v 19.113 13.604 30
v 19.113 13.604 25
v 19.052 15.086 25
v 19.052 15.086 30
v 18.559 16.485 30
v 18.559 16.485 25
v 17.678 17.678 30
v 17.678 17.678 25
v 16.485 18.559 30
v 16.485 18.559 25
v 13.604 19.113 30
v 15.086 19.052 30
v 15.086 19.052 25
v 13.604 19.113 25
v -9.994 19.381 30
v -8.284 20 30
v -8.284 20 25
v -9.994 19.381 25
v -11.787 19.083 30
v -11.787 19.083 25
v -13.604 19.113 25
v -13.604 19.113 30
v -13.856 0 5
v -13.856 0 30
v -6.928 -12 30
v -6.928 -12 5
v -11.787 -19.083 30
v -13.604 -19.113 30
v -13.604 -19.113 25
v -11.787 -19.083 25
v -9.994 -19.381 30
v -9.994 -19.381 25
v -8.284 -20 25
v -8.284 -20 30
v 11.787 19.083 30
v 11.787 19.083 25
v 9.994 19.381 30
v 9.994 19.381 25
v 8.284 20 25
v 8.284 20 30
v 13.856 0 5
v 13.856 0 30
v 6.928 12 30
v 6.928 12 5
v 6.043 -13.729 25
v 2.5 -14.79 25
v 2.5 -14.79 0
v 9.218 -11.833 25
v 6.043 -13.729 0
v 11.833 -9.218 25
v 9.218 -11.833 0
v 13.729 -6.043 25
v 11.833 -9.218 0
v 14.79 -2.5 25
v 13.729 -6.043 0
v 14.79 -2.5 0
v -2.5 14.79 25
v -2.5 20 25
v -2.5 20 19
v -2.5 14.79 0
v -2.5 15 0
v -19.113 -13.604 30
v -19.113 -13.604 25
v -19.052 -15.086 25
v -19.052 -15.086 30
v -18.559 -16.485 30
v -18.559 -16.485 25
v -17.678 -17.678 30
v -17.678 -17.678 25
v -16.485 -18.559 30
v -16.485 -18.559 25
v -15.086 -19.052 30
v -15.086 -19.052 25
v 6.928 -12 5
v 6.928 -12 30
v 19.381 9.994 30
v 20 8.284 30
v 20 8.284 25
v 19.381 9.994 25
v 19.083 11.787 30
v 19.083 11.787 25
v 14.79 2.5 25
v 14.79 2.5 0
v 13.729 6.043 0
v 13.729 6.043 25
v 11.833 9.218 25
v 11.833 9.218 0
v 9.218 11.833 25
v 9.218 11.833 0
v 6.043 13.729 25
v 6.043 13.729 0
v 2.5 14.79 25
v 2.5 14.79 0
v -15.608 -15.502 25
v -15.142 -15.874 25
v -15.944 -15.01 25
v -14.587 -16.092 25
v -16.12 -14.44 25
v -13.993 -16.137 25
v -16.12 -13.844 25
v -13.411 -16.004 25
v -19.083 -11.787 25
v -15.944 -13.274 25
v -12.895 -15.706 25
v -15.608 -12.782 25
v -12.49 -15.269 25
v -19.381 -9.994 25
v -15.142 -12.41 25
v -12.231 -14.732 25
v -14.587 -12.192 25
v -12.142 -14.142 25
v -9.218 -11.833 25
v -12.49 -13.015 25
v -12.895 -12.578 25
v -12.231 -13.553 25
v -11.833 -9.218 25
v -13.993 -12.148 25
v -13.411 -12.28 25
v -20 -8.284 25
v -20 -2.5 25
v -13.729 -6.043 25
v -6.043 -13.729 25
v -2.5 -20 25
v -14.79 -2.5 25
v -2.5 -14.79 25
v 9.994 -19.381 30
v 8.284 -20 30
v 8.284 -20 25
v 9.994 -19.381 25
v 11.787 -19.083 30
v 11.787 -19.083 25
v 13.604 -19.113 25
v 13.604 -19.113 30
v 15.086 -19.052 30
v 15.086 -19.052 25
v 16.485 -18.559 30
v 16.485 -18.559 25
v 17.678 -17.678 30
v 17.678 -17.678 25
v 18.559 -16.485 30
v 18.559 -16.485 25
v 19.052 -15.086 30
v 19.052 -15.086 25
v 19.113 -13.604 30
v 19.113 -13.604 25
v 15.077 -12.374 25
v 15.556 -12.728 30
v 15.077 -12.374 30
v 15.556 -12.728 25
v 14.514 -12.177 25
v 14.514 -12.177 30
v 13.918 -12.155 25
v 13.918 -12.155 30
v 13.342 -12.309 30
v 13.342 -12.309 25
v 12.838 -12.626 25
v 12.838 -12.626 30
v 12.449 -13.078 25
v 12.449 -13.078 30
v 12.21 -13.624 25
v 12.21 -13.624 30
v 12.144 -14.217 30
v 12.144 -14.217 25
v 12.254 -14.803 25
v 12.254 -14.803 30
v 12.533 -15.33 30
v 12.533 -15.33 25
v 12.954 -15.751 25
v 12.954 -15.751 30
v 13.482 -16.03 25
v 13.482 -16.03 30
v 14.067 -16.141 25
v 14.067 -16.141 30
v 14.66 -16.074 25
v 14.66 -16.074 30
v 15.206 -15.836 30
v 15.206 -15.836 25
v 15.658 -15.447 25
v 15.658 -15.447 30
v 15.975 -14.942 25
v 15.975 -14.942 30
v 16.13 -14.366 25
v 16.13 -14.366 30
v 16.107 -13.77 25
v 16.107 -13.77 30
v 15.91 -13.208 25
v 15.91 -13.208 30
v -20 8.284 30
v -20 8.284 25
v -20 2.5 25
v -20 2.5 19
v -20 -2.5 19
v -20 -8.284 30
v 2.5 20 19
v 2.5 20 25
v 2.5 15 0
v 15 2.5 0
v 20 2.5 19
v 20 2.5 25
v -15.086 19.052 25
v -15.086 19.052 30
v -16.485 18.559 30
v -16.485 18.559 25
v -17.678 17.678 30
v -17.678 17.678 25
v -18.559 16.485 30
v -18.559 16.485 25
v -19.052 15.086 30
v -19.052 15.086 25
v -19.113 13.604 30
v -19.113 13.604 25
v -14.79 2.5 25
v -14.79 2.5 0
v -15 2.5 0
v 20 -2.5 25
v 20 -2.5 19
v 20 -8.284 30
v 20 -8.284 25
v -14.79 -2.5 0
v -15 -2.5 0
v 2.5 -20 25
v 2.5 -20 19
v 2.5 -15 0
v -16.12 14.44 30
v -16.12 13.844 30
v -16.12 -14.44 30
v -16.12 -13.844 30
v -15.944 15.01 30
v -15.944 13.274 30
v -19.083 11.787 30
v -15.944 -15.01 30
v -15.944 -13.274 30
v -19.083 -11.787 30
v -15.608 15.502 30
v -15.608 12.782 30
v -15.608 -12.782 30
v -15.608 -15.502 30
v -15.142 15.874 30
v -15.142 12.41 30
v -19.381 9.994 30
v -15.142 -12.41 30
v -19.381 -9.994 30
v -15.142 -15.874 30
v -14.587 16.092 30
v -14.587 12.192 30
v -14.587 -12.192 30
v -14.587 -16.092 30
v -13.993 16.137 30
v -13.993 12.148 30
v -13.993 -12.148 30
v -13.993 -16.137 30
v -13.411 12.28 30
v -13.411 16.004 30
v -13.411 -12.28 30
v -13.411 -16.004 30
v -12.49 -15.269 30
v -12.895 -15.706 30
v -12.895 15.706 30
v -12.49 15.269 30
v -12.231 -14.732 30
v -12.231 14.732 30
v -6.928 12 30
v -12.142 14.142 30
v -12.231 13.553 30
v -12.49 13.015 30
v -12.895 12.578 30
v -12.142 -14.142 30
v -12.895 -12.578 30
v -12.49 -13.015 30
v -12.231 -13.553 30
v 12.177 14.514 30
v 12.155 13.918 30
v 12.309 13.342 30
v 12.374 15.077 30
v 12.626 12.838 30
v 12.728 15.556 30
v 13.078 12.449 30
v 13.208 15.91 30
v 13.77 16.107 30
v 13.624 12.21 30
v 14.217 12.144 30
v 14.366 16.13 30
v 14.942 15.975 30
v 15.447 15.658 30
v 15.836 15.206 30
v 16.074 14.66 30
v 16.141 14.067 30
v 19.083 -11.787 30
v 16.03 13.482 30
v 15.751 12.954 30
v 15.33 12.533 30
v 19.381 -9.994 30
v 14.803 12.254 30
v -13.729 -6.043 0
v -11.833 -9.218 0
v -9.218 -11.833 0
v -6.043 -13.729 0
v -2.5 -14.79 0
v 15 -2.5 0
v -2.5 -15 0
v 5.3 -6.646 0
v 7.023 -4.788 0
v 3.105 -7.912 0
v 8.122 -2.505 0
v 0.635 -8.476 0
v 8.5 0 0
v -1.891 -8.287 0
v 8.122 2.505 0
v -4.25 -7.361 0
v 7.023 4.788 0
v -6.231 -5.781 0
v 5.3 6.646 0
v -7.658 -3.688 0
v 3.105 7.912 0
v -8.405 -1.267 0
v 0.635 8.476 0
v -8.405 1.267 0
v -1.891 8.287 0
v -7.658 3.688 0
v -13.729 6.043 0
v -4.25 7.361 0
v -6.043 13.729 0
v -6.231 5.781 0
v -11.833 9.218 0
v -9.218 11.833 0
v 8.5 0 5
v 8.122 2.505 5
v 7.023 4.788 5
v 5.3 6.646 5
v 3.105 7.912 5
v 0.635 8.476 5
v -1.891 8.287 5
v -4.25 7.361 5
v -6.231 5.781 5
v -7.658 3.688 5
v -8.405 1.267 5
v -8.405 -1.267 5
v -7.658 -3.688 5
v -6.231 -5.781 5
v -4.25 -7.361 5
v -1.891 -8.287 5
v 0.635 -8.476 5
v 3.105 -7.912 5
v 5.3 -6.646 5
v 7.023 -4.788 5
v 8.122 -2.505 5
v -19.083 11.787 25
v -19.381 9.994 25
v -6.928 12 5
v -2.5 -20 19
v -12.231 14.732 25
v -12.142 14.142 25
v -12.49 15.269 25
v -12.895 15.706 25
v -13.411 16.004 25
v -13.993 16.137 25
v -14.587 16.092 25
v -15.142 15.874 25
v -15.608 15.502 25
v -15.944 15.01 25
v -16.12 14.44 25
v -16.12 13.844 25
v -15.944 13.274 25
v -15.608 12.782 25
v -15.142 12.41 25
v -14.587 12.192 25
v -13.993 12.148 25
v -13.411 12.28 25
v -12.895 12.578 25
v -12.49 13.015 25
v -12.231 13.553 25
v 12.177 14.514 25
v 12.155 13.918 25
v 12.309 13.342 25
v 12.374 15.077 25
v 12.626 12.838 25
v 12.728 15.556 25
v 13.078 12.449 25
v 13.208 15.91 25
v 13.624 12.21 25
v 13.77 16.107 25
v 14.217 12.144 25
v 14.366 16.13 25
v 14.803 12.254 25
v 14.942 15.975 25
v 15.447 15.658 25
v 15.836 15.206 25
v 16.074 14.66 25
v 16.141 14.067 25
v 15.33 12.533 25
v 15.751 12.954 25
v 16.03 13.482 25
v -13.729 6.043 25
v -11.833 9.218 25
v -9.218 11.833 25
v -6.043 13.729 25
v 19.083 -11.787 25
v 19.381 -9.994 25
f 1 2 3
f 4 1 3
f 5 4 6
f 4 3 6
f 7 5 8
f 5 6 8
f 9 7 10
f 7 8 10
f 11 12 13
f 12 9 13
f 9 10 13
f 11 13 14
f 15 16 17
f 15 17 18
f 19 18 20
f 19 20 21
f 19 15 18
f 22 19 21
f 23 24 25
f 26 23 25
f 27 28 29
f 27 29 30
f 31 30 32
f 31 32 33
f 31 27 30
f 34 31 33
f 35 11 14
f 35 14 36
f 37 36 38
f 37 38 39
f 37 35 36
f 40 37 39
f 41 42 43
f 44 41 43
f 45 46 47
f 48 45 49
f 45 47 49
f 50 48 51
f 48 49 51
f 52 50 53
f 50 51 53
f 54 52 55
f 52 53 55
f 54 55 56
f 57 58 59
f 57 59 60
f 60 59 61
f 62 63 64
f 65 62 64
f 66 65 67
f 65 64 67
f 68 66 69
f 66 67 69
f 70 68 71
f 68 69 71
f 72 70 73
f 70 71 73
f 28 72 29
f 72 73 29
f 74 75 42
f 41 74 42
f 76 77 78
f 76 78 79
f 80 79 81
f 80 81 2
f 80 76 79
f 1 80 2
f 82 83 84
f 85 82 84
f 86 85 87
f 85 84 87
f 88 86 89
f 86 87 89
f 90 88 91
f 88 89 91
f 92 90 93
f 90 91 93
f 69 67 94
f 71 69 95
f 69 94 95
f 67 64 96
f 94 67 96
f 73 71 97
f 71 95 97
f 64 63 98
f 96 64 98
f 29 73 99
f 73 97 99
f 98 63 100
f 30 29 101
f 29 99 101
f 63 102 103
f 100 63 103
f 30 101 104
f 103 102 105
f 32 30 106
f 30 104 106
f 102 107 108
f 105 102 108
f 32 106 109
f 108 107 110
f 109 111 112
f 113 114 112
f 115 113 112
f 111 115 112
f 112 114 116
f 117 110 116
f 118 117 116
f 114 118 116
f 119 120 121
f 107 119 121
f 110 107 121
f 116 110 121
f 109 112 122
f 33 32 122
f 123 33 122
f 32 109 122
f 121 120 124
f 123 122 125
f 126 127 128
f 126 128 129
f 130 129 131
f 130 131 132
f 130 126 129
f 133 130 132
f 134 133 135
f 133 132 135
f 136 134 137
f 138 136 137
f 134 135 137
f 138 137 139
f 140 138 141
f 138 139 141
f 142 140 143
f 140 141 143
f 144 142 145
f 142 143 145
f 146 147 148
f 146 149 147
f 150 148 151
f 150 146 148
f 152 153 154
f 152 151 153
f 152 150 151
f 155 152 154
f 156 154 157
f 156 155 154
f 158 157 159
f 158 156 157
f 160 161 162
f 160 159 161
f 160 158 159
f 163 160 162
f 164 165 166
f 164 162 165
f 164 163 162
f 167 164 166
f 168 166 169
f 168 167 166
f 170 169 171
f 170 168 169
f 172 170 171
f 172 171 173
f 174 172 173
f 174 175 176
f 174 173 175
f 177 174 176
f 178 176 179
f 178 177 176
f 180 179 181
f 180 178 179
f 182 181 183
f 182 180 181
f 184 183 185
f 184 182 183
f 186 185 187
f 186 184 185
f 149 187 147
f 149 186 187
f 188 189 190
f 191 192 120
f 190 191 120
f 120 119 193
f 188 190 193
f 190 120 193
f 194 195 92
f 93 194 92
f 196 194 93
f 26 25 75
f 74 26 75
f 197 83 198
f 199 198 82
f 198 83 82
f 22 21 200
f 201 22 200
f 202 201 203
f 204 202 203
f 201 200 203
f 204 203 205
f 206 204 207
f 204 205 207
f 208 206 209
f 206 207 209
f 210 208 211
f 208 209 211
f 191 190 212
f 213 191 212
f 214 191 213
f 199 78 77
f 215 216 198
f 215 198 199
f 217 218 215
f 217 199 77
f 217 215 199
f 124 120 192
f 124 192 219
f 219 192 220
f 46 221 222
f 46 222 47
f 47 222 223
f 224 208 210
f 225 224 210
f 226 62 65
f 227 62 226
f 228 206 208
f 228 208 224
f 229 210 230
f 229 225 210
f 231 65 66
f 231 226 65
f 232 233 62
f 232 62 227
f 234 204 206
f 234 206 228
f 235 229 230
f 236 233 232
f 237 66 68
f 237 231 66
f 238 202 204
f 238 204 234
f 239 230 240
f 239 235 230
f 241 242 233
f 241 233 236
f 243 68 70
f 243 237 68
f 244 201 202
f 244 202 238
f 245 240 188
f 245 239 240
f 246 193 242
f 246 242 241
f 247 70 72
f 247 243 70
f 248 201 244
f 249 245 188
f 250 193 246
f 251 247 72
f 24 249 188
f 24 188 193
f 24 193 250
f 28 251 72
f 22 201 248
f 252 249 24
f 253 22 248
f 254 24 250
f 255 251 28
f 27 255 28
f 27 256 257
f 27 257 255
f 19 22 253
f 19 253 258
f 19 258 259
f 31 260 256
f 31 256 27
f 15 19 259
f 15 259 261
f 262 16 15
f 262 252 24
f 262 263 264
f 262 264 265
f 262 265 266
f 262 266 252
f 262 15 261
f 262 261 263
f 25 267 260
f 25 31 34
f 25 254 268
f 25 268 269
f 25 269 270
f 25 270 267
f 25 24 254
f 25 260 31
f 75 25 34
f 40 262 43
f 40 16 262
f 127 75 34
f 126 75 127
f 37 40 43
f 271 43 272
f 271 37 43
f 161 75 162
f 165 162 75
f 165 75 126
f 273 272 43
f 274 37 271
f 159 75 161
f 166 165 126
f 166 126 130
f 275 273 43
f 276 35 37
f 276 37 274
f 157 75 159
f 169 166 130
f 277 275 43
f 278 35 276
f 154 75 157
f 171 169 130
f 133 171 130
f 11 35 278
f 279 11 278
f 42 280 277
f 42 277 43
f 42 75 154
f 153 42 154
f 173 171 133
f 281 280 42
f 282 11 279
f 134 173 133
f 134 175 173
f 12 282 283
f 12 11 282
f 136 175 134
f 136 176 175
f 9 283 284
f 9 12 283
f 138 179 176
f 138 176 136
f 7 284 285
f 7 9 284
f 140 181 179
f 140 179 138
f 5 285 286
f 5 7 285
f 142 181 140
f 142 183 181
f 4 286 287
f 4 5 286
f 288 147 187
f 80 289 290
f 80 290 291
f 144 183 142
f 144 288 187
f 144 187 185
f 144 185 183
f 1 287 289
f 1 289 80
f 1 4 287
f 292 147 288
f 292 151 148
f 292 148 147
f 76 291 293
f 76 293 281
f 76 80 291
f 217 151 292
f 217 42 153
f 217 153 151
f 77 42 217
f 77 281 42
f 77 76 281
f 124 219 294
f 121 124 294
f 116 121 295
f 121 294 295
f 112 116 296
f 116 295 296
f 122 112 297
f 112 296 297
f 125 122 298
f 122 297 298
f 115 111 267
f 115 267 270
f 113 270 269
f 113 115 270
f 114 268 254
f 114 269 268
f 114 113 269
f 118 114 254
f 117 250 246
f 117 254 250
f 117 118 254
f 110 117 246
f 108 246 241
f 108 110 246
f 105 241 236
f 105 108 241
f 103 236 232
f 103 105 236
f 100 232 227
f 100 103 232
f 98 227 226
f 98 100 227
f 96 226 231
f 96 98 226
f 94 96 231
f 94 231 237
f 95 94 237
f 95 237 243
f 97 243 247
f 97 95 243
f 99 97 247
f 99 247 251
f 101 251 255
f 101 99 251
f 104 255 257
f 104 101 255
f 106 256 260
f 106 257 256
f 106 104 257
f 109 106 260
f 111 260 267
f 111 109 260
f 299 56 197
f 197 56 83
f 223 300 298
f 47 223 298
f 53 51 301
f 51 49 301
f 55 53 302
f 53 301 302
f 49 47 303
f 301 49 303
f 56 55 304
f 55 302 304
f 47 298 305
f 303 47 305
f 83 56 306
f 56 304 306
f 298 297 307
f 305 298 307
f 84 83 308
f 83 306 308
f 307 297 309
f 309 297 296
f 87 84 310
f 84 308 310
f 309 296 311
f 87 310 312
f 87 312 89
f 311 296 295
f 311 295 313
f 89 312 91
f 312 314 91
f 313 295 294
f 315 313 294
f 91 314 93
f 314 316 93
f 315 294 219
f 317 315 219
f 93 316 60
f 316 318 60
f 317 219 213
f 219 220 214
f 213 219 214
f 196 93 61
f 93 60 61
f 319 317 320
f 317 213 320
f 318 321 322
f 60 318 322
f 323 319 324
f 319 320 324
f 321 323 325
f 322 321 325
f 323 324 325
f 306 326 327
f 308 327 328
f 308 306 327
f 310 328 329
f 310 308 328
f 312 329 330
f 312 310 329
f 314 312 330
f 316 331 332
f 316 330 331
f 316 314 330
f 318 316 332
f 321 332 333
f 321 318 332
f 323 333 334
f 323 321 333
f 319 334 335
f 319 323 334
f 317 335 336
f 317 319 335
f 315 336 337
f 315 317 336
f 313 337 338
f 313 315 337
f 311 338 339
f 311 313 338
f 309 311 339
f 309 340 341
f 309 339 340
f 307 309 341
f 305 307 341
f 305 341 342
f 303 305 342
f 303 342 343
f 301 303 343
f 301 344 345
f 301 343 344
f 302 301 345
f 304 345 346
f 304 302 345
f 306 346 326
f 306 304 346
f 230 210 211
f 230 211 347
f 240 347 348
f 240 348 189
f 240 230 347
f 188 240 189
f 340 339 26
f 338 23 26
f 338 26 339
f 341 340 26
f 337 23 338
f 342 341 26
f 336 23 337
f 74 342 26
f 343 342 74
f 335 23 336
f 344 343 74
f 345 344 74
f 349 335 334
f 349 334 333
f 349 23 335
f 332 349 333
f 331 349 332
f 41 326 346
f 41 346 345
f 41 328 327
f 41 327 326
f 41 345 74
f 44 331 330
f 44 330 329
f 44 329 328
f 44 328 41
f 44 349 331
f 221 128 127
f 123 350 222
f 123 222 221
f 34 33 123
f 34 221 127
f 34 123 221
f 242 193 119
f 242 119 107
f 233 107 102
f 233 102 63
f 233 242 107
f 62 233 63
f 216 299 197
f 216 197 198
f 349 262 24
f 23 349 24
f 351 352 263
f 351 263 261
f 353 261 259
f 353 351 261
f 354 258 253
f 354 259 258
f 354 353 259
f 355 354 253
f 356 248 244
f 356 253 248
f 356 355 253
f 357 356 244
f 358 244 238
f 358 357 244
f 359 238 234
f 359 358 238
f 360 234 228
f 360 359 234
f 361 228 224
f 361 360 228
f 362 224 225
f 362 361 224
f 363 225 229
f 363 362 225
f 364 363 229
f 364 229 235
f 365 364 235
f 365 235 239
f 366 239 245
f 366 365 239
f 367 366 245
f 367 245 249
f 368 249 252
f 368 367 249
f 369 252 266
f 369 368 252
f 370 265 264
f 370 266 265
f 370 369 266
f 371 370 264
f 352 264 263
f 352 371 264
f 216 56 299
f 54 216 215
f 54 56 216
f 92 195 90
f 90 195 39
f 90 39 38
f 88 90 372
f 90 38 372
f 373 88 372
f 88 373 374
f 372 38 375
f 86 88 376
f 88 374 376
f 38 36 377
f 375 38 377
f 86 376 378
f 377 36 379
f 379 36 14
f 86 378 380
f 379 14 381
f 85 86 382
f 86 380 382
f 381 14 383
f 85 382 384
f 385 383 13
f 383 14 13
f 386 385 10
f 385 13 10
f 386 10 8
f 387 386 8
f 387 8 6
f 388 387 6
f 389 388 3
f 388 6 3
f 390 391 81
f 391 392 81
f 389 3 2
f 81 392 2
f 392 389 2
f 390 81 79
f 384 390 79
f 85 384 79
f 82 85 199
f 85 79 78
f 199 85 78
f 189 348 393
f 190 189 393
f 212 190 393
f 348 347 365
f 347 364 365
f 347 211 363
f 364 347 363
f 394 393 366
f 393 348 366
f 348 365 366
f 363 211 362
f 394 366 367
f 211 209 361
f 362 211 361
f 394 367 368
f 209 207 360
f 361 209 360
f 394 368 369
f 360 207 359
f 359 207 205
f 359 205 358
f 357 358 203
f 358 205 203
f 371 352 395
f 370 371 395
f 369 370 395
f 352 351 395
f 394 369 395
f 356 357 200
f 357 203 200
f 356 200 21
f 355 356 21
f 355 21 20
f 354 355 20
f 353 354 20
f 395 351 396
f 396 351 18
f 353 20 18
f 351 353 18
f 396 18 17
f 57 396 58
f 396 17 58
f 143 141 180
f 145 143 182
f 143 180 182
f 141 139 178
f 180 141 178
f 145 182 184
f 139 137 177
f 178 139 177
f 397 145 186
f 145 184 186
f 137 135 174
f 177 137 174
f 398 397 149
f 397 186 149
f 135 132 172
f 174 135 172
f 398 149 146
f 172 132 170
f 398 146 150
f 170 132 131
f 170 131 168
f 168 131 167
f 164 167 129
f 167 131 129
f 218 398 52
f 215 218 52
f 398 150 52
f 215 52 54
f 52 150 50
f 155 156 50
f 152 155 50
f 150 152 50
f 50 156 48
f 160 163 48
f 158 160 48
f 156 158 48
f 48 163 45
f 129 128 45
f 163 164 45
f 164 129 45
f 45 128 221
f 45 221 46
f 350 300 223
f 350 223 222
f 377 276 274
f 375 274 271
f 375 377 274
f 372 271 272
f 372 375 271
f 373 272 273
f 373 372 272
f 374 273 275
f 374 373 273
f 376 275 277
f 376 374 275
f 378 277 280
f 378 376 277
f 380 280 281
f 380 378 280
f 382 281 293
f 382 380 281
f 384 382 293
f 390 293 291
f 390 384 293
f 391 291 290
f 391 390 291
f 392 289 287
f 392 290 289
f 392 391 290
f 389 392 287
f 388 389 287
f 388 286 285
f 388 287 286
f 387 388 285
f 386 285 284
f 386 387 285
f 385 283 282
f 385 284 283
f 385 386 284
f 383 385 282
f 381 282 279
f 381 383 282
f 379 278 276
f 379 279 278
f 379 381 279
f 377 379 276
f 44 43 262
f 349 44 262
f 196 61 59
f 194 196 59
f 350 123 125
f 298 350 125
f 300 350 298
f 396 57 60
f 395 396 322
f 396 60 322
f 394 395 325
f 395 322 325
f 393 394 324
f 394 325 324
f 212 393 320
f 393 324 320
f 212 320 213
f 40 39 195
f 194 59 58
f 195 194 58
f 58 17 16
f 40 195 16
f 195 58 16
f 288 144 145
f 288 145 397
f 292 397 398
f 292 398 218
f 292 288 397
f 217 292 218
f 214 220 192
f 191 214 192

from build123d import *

# Parameters (mm, degrees)
SKETCH_1_R                      = 15
EXTRUDE_1_DEPTH                 = 30
EXTRUDE_3_DEPTH                 = 5
SKETCH_6_W                      = 5
SKETCH_6_H                      = 30
EXTRUDE_4_DEPTH                 = 30
RIB_START                       = -2.5
RIB_3_DEPTH                     = 5
PATTERN_CIRCULAR_1_COUNT        = 2
PATTERN_CIRCULAR_1_ANGLE        = 90
PATTERN_START                   = -2.5
PATTERN_CIRCULAR_1_COPY_1_DEPTH = 5
CUT_EXTRUDE_1_DEPTH             = 25
SKETCH_9_R                      = 8.5
CUT_EXTRUDE_3_DEPTH             = 42.231056256
EXTRUDE_START                   = 25
SKETCH_10_R                     = 5
SKETCH_10_R_2                   = 2
EXTRUDE_5_DEPTH                 = 5
SKETCH_10_2_R                   = 2
CUT_EXTRUDE_4_DEPTH             = 42.231056256
FILLET_1_R                      = 10


# Read off the part's stored shape, not the designer's step: 筋3
with BuildPart() as part:
    # 草图1 → 凸台-拉伸1 (new body)
    with BuildSketch(Plane.XY):
        Circle(SKETCH_1_R)
    extrude(amount=EXTRUDE_1_DEPTH)

    # 草图3 → 凸台-拉伸3 (add)
    with BuildSketch(Plane.XY.offset(30)):
        Polygon((20, -8.284271247), (20, 8.284271247), (8.284271247, 20), (-8.284271247, 20), (-20, 8.284271247), (-20, -8.284271247), (-8.284271247, -20), (8.284271247, -20), align=None)
    extrude(amount=-EXTRUDE_3_DEPTH)

    # 草图6 → 凸台-拉伸4 (add, through all)
    with BuildSketch(Plane.XY):
        Rectangle(SKETCH_6_W, SKETCH_6_H)
    extrude_4 = extrude(amount=EXTRUDE_4_DEPTH)

    # 筋3 outline → 筋3 (add)
    with BuildSketch(Plane(origin=(0, 0, 0), x_dir=(0, 0, -1), z_dir=(1, 0, 0)).offset(RIB_START)):
        Polygon((0, 15), (-19, 20), (-25, 20), (-25, 15), align=None)
    rib_3 = extrude(amount=RIB_3_DEPTH)

    # 镜向1: 筋3 across plane
    add(rib_3.mirror(Plane.ZX))

    # 阵列(圆周)1: 凸台-拉伸4, 筋3 ×2 about axis
    pattern_circular_1_axis = Axis((0, 0, 0), (0, 0, 1))
    add([extrude_4.rotate(pattern_circular_1_axis, i * PATTERN_CIRCULAR_1_ANGLE / (PATTERN_CIRCULAR_1_COUNT - 1)) for i in range(1, PATTERN_CIRCULAR_1_COUNT)])
    add([rib_3.rotate(pattern_circular_1_axis, i * PATTERN_CIRCULAR_1_ANGLE / (PATTERN_CIRCULAR_1_COUNT - 1)) for i in range(1, PATTERN_CIRCULAR_1_COUNT)])

    # 阵列(圆周)1 copy 1 sketch → 阵列(圆周)1 copy 1 (add)
    with BuildSketch(Plane(origin=(0, 0, 0), x_dir=(0, 0, -1), z_dir=(0, 1, 0)).offset(PATTERN_START)):
        Polygon((0, -15), (-19, -20), (-25, -20), (-25, -15), align=None)
    extrude(amount=PATTERN_CIRCULAR_1_COPY_1_DEPTH)

    # 草图8 → 切除-拉伸1 (cut)
    with BuildSketch(Plane.XY.offset(30)):
        Polygon((6.92820323, 12), (-6.92820323, 12), (-13.856406461, 0), (-6.92820323, -12), (6.92820323, -12), (13.856406461, 0), align=None)
    extrude(amount=-CUT_EXTRUDE_1_DEPTH, mode=Mode.SUBTRACT)

    # 草图9 → 切除-拉伸3 (cut, through all)
    with BuildSketch(Plane.XY):
        Circle(SKETCH_9_R)
    extrude(amount=CUT_EXTRUDE_3_DEPTH, mode=Mode.SUBTRACT)

    # 草图10 → 凸台-拉伸5 (add, through all)
    # profile 1 of 4: a face of its own
    with BuildSketch(Plane.XY.offset(EXTRUDE_START)):
        with Locations((14.142135624, 14.142135624)):
            Circle(SKETCH_10_R)
        with Locations((14.142135624, 14.142135624)):
            Circle(SKETCH_10_R_2, mode=Mode.SUBTRACT)
    # profile 2 of 4: a face of its own
    with BuildSketch(Plane.XY.offset(EXTRUDE_START)):
        with Locations((14.142135624, -14.142135624)):
            Circle(SKETCH_10_R)
        with Locations((14.142135624, -14.142135624)):
            Circle(SKETCH_10_R_2, mode=Mode.SUBTRACT)
    # profile 3 of 4: a face of its own
    with BuildSketch(Plane.XY.offset(EXTRUDE_START)):
        with Locations((-14.142135624, -14.142135624)):
            Circle(SKETCH_10_R)
        with Locations((-14.142135624, -14.142135624)):
            Circle(SKETCH_10_R_2, mode=Mode.SUBTRACT)
    # profile 4 of 4: a face of its own
    with BuildSketch(Plane.XY.offset(EXTRUDE_START)):
        with Locations((-14.142135624, 14.142135624)):
            Circle(SKETCH_10_R)
        with Locations((-14.142135624, 14.142135624)):
            Circle(SKETCH_10_R_2, mode=Mode.SUBTRACT)
    extrude(amount=EXTRUDE_5_DEPTH)

    # 草图10<2> → 切除-拉伸4 (cut, through all)
    with BuildSketch(Plane.XY):
        with Locations((-14.142135624, 14.142135624)):
            Circle(SKETCH_10_2_R)
        with Locations((14.142135624, 14.142135624)):
            Circle(SKETCH_10_2_R)
        with Locations((14.142135624, -14.142135624)):
            Circle(SKETCH_10_2_R)
        with Locations((-14.142135624, -14.142135624)):
            Circle(SKETCH_10_2_R)
    extrude(amount=CUT_EXTRUDE_4_DEPTH, mode=Mode.SUBTRACT)

    # 圆角1
    # the kernel refuses this fillet: 10 mm, written as the material it adds along each edge
    with BuildSketch(Plane(origin=(10.606601718, -17.67766953, 30), x_dir=(0.9019133199255954, -0.4319170792418269, 0), z_dir=(0, 0, -1)), Plane(origin=(17.67766953, 10.606601718, 30), x_dir=(0.43191707924182504, 0.9019133199255963, 0), z_dir=(0, 0, -1)), Plane(origin=(-10.606601718, 17.67766953, 30), x_dir=(-0.9019133199255949, 0.4319170792418281, 0), z_dir=(0, 0, -1)), Plane(origin=(-17.67766953, -10.606601718, 30), x_dir=(-0.43191707924182854, -0.9019133199255946, 0), z_dir=(0, 0, -1))) as fillet_1_piece_1:
        with BuildLine():
            CenterArc((6.646750578, 9.431605202), FILLET_1_R, 219.30149192, 31.287792541)
            Line((-1.091486591, 3.097594978), (-1.246251334, 2.970914774))
            ThreePointArc((-1.246251334, 2.970914774), (-0.734375399, 1.482329983), (-0.188632104, -0.066467506))
            Line((-0.188632104, -0.066467506), (0.066467506, -0.188632104))
            ThreePointArc((0.066467506, -0.188632104), (1.661687645, 0.084197399), (3.256907783, -0.188632104))
            Line((3.256907783, -0.188632104), (3.323375289, 0))
        make_face()
    extrude(amount=5)
    with BuildSketch(Plane(origin=(17.67766953, -10.606601718, 30), x_dir=(0.4319170792418248, -0.9019133199255964, 0), z_dir=(0, 0, -1))) as fillet_1_piece_2:
        with BuildLine():
            CenterArc((6.646750578, -9.431605202), FILLET_1_R, 109.410715538, 31.287792541)
            Line((-1.091486591, -3.097594978), (-1.246251334, -2.970914774))
            ThreePointArc((-1.246251334, -2.970914774), (-0.734375399, -1.482329983), (-0.188632104, 0.066467506))
            Line((-0.188632104, 0.066467506), (0.066467506, 0.188632104))
            ThreePointArc((0.066467506, 0.188632104), (1.661687645, -0.084197399), (3.256907783, 0.188632104))
            Line((3.256907783, 0.188632104), (3.323375289, 0))
        make_face()
    extrude(amount=5)
    with BuildSketch(Plane(origin=(10.606601718, 17.67766953, 30), x_dir=(-0.7071067811865472, 0.7071067811865478, 0), z_dir=(0, 0, -1)), Plane(origin=(-17.67766953, 10.606601718, 30), x_dir=(-0.7071067811865486, -0.7071067811865465, 0), z_dir=(0, 0, -1)), Plane(origin=(-10.606601718, -17.67766953, 30), x_dir=(0.7071067811865476, -0.7071067811865476, 0), z_dir=(0, 0, -1))) as fillet_1_piece_3:
        with BuildLine():
            CenterArc((6.686553006, 9.4034291), FILLET_1_R, 218.821431077, 31.287792541)
            Line((-1.104482331, 3.134476367), (-1.260303038, 3.009097312))
            ThreePointArc((-1.260303038, 3.009097312), (-0.472829503, 1.595220139), (-0.2, 0))
            Line((-0.2, 0), (0, -0.2))
            ThreePointArc((0, -0.2), (1.642135624, -0.2), (3.216225612, -0.188068582))
            Line((3.216225612, -0.188068582), (3.284271247, 0))
        make_face()
    extrude(amount=5)


solid = part.part
